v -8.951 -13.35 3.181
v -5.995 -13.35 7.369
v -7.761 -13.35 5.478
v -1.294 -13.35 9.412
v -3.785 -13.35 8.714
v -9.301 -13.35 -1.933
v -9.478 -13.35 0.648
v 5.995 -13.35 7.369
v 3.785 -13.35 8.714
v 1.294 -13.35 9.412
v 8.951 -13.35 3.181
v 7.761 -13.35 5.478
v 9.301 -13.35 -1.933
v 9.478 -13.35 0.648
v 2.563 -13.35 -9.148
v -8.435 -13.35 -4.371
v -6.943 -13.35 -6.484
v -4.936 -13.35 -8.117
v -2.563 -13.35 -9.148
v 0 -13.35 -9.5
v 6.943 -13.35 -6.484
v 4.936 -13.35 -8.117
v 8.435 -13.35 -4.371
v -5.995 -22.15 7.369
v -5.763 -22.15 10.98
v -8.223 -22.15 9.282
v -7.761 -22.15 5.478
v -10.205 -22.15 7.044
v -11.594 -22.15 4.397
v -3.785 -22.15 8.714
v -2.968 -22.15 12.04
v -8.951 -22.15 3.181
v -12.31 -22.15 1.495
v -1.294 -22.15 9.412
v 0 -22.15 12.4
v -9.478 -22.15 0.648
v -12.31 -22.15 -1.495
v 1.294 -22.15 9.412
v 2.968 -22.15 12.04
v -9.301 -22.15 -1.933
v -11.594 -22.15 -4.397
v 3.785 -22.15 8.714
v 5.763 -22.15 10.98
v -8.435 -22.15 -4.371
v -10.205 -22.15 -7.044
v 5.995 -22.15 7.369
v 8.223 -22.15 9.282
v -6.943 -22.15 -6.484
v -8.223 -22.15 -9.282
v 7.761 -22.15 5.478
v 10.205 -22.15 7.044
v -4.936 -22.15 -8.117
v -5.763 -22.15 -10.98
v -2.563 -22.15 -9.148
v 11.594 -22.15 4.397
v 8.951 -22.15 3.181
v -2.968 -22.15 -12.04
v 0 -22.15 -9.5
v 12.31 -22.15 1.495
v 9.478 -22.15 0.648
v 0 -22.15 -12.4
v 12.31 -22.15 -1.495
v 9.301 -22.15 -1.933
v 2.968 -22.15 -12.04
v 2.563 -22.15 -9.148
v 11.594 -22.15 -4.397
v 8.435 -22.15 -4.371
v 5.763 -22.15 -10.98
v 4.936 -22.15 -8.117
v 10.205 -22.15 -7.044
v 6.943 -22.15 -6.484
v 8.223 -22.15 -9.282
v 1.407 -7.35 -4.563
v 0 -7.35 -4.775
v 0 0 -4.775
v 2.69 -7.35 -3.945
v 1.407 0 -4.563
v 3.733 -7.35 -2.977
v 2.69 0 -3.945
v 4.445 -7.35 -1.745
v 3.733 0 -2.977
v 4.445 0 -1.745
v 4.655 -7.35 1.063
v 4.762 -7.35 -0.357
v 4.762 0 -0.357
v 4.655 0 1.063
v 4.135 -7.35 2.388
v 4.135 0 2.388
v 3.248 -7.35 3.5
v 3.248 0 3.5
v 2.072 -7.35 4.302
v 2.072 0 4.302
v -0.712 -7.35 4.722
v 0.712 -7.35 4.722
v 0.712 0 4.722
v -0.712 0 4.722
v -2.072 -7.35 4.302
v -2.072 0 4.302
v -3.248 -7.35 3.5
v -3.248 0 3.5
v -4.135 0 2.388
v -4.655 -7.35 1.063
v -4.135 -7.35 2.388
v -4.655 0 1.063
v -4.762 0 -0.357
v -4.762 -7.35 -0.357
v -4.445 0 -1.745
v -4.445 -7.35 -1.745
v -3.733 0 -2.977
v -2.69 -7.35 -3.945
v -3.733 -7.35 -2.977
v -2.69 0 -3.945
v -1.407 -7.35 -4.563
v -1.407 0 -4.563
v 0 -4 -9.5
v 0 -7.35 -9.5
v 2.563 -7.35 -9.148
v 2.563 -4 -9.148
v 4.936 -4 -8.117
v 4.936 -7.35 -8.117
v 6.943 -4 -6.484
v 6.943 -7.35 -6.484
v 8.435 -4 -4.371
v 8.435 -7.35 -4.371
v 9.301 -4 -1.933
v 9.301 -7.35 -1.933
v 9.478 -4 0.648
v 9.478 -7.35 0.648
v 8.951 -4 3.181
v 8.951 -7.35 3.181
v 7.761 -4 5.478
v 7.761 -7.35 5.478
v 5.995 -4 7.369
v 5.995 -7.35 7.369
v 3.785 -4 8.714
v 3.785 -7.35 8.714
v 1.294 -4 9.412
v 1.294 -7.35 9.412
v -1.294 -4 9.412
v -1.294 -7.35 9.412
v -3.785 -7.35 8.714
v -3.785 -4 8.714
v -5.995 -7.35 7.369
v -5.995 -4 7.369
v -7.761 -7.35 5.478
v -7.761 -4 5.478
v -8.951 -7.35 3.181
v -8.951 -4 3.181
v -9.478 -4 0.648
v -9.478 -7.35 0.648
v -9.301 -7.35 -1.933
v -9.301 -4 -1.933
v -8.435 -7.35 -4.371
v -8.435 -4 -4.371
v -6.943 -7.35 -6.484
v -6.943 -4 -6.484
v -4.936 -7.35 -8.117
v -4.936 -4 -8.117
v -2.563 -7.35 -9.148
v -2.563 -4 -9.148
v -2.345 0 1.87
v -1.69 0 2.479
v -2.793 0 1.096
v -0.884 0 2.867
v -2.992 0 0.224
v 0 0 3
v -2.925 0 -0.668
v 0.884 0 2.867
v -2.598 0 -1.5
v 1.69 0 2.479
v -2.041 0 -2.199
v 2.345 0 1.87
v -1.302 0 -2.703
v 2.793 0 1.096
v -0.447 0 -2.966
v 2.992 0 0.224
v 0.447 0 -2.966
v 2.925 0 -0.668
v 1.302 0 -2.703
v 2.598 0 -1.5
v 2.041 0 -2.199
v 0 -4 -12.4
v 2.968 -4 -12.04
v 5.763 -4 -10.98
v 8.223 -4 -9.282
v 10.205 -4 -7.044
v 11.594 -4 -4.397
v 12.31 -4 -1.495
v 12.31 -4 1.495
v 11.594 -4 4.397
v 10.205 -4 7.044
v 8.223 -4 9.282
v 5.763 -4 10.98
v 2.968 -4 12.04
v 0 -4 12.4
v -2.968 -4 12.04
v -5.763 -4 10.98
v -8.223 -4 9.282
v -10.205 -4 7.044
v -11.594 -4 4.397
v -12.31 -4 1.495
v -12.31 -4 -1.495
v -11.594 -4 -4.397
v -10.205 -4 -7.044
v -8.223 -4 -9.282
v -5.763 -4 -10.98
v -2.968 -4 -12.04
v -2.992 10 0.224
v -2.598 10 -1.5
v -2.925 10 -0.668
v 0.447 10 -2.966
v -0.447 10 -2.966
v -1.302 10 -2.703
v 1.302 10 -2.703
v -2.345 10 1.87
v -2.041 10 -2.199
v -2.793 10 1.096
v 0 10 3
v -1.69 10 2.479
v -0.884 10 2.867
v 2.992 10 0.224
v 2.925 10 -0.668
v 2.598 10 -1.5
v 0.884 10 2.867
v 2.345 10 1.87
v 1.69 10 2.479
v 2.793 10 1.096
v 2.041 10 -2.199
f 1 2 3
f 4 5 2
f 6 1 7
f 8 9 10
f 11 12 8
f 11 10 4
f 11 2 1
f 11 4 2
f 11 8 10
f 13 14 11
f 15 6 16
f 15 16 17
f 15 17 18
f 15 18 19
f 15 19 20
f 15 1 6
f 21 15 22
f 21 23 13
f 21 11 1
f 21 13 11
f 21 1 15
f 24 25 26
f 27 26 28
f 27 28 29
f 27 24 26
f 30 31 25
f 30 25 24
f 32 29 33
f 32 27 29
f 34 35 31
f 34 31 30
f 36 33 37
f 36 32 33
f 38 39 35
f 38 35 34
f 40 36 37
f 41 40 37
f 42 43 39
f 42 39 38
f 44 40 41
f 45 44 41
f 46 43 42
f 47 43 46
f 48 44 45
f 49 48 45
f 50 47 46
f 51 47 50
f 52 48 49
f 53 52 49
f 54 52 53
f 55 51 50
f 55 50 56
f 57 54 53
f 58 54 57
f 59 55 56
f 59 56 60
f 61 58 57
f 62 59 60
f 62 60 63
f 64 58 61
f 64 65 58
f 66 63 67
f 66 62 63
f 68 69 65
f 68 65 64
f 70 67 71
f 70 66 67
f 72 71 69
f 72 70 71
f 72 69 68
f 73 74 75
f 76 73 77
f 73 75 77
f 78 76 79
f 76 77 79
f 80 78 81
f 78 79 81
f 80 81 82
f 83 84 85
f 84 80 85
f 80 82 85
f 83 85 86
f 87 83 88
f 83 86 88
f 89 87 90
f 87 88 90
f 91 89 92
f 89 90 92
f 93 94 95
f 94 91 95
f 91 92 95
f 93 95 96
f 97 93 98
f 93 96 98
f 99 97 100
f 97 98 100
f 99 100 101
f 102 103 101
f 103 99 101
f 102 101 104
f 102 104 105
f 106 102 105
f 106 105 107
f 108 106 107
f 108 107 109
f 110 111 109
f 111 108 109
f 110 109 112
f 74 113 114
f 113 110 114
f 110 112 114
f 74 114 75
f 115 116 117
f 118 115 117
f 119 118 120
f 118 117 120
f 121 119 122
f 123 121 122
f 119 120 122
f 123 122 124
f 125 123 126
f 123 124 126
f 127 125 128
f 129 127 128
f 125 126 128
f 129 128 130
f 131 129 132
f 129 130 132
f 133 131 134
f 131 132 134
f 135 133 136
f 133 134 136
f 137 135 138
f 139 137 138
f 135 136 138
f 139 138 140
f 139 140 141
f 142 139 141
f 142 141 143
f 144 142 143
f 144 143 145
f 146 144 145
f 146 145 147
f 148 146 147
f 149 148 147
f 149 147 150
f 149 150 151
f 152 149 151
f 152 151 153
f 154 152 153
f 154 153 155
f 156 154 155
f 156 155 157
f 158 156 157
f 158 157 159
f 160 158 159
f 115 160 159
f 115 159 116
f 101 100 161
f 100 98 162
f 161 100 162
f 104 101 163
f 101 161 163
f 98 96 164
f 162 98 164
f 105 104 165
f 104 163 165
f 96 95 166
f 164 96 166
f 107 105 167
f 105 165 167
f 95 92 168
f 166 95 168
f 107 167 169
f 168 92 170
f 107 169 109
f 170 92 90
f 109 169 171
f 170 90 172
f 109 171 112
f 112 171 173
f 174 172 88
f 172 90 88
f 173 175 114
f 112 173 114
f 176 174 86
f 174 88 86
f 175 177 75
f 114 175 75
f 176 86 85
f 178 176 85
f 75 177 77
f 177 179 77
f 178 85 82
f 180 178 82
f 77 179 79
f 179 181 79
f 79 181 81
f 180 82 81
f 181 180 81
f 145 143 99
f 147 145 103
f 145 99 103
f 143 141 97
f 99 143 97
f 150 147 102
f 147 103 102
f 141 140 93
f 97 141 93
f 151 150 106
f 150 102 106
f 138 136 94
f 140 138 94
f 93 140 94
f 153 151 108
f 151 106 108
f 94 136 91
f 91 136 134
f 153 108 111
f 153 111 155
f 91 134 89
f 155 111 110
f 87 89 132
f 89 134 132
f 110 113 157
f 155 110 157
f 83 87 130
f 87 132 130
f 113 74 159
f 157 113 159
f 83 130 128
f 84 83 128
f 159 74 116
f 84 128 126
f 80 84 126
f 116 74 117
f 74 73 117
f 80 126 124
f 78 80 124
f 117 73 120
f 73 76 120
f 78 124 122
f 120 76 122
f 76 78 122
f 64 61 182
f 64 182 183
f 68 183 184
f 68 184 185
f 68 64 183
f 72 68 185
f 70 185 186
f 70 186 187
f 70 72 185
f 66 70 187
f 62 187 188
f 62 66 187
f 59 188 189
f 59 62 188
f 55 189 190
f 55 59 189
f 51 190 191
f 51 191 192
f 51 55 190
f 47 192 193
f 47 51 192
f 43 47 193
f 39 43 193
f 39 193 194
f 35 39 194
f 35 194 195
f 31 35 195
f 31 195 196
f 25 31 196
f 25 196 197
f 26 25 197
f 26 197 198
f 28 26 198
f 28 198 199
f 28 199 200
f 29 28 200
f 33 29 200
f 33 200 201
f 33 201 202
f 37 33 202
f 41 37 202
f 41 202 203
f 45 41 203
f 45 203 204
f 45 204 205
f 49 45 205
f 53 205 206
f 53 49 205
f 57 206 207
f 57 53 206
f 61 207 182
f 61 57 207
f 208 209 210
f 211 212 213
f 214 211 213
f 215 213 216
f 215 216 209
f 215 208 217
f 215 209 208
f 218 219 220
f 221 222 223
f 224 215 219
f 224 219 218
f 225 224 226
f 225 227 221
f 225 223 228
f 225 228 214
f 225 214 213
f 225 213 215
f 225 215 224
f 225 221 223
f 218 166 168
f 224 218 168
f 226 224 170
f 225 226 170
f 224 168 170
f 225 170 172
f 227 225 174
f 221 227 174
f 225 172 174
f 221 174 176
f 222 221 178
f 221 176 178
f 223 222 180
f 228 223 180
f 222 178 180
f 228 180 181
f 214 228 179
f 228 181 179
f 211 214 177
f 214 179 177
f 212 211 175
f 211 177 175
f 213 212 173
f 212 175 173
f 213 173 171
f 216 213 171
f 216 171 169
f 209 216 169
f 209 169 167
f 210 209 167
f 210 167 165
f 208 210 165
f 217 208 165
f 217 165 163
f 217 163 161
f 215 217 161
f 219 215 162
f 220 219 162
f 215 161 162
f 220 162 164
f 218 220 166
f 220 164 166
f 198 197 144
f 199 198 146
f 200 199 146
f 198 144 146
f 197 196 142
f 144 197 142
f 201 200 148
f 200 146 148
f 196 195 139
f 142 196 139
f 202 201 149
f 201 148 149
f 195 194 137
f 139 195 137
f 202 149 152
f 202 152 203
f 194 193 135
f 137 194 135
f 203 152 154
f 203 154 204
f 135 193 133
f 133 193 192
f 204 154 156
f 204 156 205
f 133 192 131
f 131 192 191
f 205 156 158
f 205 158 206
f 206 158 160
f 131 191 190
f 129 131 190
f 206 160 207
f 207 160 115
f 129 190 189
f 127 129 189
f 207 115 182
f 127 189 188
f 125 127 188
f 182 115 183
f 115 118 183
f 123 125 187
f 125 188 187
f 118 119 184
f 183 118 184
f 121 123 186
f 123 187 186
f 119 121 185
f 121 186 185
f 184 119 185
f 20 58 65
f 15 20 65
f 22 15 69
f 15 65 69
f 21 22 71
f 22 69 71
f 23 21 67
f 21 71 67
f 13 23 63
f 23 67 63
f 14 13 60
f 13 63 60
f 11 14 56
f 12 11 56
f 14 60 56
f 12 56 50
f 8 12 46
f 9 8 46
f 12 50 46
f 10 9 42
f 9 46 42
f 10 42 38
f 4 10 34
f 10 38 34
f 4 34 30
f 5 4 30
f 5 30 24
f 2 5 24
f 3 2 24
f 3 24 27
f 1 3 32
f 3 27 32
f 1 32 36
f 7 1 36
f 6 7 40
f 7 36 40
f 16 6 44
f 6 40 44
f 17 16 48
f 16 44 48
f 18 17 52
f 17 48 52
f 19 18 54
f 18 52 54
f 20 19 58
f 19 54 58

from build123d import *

# Parameters (mm, degrees)
SKETCH1_R                = 3
BOSS_EXTRUDE1_DEPTH      = 10
SKETCH2_R                = 4.775
BOSS_EXTRUDE2_DEPTH      = 10.35
BOSS_EXTRUDE3_DEPTH      = 3
BOSS_EXTRUDE3_DEPTH_BACK = 3
SKETCH3_R                = 9.5
SKETCH4_R                = 12.4
SKETCH4_R_2              = 9.5
BOSS_EXTRUDE4_DEPTH      = 9.35
BOSS_EXTRUDE5_START      = 8.8
SKETCH5_R                = 12.4
SKETCH5_R_2              = 9.5
BOSS_EXTRUDE5_DEPTH      = 8.8


with BuildPart() as part:
    # Sketch1 → Boss-Extrude1 (new body)
    with BuildSketch(Plane(origin=(0, 0, 0), x_dir=(1, 0, 0), z_dir=(0, 1, 0))):
        with Locations(Location((0, 0, 0), (0, 0, 270))):
            Circle(SKETCH1_R)
    extrude(amount=BOSS_EXTRUDE1_DEPTH)

    # Sketch2 → Boss-Extrude2 (add)
    with BuildSketch(Plane.XZ):
        with Locations(Location((0, 0, 0), (0, 0, 270))):
            Circle(SKETCH2_R)
    extrude(amount=BOSS_EXTRUDE2_DEPTH)

    # Sketch3 → Boss-Extrude3 (add, two sides: drawn at the far end of the back side and taken through both)
    with BuildSketch(Plane.XZ.offset(10.35).offset(-BOSS_EXTRUDE3_DEPTH_BACK)):
        with Locations(Location((0, 0, 0), (0, 0, 270))):
            Circle(SKETCH3_R)
    extrude(amount=BOSS_EXTRUDE3_DEPTH + BOSS_EXTRUDE3_DEPTH_BACK)

    # Sketch4 → Boss-Extrude4 (add)
    with BuildSketch(Plane.XZ.offset(13.35)):
        with Locations(Location((0, 0, 0), (0, 0, 270))):
            Circle(SKETCH4_R)
        with Locations(Location((0, 0, 0), (0, 0, 270))):
            Circle(SKETCH4_R_2, mode=Mode.SUBTRACT)
    extrude(amount=-BOSS_EXTRUDE4_DEPTH)

    # Sketch5 → Boss-Extrude5 (add)
    with BuildSketch(Plane.XZ.offset(13.35).offset(BOSS_EXTRUDE5_START)):
        with Locations(Location((0, 0, 0), (0, 0, 270))):
            Circle(SKETCH5_R)
        with Locations(Location((0, 0, 0), (0, 0, 270))):
            Circle(SKETCH5_R_2, mode=Mode.SUBTRACT)
    extrude(amount=-BOSS_EXTRUDE5_DEPTH)


solid = part.part
